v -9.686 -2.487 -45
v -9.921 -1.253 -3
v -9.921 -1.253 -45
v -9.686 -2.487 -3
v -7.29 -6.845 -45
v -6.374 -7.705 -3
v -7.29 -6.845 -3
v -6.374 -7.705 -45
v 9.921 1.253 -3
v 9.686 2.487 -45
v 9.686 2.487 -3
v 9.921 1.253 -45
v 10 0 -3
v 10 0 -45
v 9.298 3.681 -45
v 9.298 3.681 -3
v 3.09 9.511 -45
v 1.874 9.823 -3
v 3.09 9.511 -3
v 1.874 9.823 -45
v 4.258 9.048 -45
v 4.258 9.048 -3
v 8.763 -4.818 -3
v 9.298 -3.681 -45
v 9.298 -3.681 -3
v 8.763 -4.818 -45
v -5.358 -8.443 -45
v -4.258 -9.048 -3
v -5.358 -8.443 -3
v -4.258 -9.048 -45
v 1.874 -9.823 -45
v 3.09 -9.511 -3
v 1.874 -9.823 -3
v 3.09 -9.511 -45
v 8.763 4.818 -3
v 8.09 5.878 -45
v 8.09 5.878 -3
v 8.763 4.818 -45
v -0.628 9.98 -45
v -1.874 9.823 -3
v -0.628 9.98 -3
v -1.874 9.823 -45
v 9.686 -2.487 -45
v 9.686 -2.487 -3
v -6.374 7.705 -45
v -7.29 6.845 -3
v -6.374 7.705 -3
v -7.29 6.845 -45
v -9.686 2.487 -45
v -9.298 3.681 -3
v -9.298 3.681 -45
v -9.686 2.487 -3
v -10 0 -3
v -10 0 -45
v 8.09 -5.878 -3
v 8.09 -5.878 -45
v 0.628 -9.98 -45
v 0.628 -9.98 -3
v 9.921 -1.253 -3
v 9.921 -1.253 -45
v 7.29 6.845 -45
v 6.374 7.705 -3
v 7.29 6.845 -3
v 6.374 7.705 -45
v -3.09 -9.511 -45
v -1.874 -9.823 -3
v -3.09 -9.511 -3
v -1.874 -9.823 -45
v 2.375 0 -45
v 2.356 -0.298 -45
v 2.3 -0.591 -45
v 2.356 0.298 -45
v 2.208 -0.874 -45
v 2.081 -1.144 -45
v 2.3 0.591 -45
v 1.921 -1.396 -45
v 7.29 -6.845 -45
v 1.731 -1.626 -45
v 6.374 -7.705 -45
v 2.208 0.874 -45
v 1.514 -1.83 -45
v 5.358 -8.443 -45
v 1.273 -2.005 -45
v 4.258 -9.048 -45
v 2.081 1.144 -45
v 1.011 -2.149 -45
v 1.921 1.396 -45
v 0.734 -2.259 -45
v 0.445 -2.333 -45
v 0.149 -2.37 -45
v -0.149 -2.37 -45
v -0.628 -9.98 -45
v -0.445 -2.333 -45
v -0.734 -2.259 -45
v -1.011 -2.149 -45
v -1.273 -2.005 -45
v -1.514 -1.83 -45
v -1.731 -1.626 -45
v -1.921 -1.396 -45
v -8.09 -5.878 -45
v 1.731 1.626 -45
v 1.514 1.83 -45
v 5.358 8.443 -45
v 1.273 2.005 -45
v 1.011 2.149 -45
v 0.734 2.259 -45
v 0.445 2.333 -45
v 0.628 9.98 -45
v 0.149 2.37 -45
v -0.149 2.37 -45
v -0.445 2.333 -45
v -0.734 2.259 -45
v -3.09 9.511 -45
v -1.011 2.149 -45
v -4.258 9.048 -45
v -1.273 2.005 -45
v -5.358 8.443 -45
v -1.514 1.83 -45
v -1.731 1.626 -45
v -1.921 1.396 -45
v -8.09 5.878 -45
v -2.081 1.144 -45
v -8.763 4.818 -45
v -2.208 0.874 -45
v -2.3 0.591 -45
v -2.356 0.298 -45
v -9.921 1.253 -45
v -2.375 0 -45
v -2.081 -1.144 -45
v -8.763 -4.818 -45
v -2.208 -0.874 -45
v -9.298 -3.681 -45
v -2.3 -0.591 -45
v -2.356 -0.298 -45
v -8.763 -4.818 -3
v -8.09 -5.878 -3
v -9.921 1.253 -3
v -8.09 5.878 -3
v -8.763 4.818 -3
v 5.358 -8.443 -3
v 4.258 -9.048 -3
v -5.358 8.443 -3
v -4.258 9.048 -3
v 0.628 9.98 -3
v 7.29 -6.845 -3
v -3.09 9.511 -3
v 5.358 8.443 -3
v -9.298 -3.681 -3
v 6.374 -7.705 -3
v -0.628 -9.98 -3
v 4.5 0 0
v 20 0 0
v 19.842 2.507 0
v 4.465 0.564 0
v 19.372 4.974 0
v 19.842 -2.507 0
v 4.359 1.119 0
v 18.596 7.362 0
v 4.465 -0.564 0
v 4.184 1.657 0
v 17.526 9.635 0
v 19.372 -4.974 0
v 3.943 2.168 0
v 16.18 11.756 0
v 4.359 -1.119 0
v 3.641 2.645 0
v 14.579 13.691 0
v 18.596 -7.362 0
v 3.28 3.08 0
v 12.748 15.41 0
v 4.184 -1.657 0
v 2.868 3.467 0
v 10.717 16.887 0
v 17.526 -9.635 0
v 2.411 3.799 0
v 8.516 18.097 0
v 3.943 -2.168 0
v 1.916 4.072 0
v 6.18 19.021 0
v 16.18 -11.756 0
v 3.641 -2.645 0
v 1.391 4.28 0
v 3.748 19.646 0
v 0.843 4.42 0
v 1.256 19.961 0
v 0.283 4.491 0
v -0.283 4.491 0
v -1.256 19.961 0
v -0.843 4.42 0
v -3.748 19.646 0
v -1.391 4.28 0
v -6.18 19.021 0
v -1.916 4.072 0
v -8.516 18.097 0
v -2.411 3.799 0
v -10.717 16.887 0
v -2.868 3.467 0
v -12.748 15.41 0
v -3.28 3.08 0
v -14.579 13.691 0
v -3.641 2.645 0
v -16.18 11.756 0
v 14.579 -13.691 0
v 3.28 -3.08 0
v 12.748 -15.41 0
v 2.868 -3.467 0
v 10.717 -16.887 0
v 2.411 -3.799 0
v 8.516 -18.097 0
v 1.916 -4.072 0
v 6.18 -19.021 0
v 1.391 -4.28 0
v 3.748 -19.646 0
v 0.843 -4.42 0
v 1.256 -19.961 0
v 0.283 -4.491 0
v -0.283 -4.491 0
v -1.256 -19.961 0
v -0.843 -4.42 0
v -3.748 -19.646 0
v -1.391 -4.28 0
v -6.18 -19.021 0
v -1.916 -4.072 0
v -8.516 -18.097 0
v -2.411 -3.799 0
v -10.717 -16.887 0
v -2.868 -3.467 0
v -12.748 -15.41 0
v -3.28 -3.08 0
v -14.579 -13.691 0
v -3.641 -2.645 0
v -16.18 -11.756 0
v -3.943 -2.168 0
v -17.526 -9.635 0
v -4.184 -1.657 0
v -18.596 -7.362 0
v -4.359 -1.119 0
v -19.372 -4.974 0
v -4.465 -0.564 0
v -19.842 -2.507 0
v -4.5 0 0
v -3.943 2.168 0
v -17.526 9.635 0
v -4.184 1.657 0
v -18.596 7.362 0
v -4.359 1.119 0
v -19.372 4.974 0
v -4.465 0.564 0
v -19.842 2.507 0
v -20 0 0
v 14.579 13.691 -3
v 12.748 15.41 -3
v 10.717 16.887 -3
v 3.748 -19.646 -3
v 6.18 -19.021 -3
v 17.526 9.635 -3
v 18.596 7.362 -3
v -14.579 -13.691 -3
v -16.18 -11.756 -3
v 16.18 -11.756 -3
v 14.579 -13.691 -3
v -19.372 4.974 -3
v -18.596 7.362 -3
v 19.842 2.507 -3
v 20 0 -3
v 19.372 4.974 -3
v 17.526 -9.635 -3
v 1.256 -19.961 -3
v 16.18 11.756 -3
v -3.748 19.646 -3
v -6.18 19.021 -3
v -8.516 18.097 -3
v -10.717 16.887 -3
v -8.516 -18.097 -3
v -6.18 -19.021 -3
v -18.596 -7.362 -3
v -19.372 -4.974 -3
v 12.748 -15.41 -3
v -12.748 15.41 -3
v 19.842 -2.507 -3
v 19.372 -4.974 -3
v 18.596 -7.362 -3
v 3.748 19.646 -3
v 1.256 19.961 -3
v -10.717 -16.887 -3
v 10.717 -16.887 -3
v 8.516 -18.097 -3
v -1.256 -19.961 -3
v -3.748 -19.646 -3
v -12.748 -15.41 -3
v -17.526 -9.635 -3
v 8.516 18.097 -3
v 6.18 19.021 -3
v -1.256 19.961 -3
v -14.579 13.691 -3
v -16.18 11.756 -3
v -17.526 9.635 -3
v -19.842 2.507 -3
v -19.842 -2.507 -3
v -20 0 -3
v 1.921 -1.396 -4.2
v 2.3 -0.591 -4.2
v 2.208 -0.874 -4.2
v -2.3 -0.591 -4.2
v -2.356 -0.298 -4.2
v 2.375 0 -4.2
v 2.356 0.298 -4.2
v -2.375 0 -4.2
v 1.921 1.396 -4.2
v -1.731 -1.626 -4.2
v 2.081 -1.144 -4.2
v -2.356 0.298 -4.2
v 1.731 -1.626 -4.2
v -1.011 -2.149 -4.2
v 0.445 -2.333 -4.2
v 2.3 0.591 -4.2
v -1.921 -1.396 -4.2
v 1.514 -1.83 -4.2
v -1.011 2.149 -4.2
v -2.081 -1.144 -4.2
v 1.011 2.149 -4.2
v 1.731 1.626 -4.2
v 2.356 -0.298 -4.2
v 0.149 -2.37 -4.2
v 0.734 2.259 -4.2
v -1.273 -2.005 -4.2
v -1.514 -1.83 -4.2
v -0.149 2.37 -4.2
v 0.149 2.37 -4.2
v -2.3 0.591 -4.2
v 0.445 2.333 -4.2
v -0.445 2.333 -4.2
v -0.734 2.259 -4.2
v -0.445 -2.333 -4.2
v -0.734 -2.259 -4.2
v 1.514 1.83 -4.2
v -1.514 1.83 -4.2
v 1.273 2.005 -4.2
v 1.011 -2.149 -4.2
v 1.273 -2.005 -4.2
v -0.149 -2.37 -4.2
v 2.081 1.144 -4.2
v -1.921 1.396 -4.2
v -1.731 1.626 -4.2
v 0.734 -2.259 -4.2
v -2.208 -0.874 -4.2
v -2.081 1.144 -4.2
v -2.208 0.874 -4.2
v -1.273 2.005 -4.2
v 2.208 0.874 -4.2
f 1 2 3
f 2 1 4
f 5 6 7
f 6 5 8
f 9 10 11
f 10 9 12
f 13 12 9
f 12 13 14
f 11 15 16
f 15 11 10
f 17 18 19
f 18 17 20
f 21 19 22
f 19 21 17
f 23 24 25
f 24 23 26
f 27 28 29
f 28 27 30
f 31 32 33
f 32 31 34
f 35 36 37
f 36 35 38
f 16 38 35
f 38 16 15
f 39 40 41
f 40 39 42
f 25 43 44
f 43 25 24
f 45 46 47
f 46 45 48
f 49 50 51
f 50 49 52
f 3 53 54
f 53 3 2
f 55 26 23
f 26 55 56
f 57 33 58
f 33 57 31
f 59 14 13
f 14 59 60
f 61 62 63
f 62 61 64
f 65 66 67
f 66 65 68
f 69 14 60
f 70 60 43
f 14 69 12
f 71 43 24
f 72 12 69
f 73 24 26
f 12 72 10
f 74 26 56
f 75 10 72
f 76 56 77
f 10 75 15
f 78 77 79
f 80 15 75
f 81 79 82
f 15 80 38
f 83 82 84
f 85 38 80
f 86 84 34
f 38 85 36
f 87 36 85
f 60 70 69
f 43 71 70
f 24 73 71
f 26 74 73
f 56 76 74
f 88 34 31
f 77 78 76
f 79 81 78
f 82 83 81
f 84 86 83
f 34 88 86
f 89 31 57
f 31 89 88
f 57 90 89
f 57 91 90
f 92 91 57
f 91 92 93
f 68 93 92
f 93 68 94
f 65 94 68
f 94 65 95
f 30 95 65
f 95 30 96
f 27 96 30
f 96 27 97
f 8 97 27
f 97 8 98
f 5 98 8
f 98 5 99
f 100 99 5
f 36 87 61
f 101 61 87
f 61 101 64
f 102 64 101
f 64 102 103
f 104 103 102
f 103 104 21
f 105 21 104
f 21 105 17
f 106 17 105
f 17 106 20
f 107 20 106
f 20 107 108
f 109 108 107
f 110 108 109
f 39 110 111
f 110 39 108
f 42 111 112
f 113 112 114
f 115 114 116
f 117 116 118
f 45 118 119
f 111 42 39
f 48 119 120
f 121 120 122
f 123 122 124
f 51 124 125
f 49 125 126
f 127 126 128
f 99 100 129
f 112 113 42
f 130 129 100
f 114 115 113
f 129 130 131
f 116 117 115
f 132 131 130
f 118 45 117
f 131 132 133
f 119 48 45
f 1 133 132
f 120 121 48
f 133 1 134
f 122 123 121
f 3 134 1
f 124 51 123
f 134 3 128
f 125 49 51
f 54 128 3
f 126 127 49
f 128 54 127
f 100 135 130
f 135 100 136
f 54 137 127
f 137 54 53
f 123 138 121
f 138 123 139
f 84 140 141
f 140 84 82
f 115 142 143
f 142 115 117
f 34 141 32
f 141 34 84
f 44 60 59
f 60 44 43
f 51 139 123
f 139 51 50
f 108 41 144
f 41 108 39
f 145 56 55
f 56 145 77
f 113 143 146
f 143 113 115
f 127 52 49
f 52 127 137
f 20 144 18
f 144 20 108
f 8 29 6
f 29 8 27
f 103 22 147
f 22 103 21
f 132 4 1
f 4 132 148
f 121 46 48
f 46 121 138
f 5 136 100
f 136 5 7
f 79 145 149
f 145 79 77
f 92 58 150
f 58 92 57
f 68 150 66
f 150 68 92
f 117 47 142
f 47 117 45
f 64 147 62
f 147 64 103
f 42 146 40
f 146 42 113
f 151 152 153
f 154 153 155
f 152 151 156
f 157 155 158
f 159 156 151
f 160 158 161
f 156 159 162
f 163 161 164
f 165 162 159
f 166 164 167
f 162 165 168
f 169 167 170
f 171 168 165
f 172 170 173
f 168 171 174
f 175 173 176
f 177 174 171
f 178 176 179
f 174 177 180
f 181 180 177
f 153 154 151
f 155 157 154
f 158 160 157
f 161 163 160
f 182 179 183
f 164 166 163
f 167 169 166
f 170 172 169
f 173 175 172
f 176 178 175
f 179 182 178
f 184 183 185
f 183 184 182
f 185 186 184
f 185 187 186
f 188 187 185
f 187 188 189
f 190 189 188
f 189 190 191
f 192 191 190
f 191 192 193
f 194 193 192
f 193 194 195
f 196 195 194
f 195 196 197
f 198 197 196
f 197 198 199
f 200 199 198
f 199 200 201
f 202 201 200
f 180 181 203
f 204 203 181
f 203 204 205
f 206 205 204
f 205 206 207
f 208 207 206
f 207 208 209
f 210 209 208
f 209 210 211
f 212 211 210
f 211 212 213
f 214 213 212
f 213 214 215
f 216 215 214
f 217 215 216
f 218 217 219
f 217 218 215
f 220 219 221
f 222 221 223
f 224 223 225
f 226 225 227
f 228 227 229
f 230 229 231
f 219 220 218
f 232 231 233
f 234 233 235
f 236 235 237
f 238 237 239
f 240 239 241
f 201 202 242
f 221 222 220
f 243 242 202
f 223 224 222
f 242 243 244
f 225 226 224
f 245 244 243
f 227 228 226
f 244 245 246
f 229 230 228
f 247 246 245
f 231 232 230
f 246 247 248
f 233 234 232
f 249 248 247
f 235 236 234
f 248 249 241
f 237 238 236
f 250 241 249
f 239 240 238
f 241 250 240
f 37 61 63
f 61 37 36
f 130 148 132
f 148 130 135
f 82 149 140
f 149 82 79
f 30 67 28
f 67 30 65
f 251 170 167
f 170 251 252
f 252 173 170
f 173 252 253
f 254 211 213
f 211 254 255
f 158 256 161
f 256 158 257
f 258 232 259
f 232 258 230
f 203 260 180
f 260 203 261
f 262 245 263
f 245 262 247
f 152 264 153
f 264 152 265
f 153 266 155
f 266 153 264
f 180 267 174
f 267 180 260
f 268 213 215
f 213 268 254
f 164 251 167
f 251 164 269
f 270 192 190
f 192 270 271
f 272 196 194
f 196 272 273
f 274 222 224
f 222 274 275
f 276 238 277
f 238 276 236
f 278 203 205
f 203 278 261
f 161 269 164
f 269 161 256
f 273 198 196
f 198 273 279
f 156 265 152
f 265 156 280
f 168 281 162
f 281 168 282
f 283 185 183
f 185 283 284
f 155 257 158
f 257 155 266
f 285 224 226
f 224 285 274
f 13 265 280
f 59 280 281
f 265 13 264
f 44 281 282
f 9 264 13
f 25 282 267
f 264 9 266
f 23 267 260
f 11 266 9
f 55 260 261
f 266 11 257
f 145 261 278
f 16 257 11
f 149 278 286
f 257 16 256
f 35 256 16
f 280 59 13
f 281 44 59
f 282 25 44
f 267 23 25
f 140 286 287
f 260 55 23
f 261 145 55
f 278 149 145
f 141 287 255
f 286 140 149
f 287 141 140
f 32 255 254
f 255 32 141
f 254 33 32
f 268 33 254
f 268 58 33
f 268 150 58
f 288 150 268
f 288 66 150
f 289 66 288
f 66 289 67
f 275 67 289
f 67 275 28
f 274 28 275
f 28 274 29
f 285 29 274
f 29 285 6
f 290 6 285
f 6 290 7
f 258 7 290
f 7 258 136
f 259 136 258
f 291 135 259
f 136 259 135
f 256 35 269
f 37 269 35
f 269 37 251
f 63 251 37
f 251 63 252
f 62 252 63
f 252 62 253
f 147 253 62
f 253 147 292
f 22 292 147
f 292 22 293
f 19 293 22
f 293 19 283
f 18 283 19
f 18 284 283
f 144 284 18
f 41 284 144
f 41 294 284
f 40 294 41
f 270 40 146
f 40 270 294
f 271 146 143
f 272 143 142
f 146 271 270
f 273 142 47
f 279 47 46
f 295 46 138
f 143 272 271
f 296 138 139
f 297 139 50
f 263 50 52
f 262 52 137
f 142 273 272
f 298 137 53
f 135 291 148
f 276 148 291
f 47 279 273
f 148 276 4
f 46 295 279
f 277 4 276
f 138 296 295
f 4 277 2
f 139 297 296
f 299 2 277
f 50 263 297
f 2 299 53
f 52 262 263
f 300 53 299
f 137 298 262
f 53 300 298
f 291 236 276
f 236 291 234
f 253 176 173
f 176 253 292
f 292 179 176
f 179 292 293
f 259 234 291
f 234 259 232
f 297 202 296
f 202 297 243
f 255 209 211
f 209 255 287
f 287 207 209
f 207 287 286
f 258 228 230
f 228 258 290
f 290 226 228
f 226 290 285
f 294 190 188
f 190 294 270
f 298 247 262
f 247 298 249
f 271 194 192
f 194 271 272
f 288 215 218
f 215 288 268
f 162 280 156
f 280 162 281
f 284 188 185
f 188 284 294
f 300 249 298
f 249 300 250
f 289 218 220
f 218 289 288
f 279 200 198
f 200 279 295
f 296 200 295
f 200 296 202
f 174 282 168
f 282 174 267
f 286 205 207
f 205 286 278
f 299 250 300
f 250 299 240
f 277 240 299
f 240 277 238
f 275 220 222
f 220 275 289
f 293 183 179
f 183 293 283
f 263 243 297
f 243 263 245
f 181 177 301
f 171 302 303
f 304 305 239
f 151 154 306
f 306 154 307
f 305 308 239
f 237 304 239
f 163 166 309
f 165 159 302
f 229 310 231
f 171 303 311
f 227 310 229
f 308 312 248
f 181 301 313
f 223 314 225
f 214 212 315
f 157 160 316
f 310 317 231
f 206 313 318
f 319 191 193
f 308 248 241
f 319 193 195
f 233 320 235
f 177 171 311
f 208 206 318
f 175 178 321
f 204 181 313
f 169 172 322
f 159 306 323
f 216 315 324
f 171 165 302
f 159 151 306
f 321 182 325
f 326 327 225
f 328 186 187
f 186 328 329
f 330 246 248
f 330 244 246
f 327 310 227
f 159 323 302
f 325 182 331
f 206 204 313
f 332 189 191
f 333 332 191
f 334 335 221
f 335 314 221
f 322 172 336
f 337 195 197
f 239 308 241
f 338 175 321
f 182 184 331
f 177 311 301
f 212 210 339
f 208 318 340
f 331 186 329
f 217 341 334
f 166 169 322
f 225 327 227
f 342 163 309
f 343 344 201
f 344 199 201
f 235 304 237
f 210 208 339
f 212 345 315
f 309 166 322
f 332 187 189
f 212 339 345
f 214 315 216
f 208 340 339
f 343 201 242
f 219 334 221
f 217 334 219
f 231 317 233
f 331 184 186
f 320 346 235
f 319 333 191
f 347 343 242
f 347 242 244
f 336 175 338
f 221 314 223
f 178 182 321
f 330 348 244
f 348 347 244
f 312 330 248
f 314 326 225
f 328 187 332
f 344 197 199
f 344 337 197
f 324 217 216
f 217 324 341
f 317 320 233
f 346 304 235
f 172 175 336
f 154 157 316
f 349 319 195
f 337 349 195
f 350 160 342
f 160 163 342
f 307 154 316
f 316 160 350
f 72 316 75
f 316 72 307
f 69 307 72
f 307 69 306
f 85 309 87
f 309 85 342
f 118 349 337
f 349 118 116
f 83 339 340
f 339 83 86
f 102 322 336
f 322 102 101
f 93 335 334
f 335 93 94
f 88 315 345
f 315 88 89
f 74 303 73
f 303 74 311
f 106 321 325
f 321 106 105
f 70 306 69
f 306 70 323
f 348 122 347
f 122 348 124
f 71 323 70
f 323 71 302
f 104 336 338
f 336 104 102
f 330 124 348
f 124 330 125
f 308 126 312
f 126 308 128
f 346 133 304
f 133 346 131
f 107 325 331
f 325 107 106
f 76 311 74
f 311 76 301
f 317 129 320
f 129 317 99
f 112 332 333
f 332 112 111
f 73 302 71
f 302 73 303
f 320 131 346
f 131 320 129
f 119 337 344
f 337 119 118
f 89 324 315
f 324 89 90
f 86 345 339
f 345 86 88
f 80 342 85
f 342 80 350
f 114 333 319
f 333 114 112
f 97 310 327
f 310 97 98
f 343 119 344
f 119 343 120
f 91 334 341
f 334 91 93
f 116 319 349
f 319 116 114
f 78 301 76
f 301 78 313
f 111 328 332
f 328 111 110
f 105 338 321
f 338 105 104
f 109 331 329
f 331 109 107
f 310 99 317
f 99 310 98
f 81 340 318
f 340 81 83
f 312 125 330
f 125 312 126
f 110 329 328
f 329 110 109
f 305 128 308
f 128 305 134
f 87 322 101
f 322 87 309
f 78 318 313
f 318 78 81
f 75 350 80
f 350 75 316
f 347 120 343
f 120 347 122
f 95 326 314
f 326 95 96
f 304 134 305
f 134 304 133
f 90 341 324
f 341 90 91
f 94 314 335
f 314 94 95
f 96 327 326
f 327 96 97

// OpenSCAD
$fn = 50;


difference() {
	union() {
		translate(v = [0, 0, -45.0000000000]) {
			cylinder(h = 45, r = 10.0000000000);
		}
		translate(v = [0, 0, -3.0000000000]) {
			cylinder(h = 3, r = 20.0000000000);
		}
	}
	union() {
		translate(v = [0, 0, 0]) {
			rotate(a = [0, 0, 0]) {
				difference() {
					union() {
						#translate(v = [0, 0, -45.0000000000]) {
							cylinder(h = 45, r = 2.2500000000);
						}
						#translate(v = [0, 0, -4.2000000000]) {
							cylinder(h = 4.2000000000, r = 10.0000000000, r1 = 2.3750000000, r2 = 4.5000000000);
						}
						#translate(v = [0, 0, -45.0000000000]) {
							cylinder(h = 45, r = 2.3750000000);
						}
						#translate(v = [0, 0, -45.0000000000]) {
							cylinder(h = 45, r = 2.2500000000);
						}
					}
					union();
				}
			}
		}
	}
}
